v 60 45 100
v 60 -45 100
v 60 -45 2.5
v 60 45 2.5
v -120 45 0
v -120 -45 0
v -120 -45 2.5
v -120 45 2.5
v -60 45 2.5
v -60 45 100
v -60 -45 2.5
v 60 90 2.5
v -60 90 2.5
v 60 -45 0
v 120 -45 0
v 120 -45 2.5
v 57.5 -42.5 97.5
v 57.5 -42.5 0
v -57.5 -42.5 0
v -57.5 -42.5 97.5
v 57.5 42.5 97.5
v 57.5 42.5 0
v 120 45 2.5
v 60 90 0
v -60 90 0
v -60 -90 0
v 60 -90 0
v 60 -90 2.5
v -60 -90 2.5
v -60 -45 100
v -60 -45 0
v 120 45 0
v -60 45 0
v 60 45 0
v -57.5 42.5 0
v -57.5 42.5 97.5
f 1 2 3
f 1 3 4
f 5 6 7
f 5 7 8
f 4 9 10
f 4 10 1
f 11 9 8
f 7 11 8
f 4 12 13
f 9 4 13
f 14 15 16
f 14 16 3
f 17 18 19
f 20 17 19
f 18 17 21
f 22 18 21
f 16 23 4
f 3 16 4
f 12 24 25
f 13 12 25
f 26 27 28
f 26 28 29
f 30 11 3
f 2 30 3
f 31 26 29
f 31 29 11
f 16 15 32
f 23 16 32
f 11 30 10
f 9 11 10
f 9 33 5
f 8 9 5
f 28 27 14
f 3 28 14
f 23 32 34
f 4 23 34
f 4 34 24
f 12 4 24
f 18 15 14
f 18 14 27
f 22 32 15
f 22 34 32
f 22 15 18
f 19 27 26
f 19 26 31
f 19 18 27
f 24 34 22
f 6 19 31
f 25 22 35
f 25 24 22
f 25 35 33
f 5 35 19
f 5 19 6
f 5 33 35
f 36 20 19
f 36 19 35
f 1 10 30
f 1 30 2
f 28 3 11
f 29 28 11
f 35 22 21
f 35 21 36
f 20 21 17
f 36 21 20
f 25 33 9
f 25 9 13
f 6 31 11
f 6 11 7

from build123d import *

# Parameters (mm, degrees)
CROQUIS1_W              = 120
CROQUIS1_H              = 90
SALIENTE_EXTRUIR1_DEPTH = 100
CROQUIS2_W              = 115
CROQUIS2_H              = 85
CORTAR_EXTRUIR1_DEPTH   = 97.5
CROQUIS3_W              = 60
CROQUIS3_H              = 90
CROQUIS3_W_2            = 120
CROQUIS3_H_2            = 45
CROQUIS3_W_3            = 115
CROQUIS3_H_3            = 85
SALIENTE_EXTRUIR2_DEPTH = 2.5


with BuildPart() as part:
    # Croquis1 → Saliente-Extruir1 (new body)
    with BuildSketch(Plane.XY):
        Rectangle(CROQUIS1_W, CROQUIS1_H)
    extrude(amount=SALIENTE_EXTRUIR1_DEPTH)

    # Croquis2 → Cortar-Extruir1 (cut)
    with BuildSketch(Plane(origin=(0, 0, 0), x_dir=(-1, 0, 0), z_dir=(0, 0, -1))):
        Rectangle(CROQUIS2_W, CROQUIS2_H)
    extrude(amount=-CORTAR_EXTRUIR1_DEPTH, mode=Mode.SUBTRACT)

    # Croquis3 → Saliente-Extruir2 (add)
    # profile 1 of 5: a face of its own
    with BuildSketch(Plane(origin=(0, 0, 0), x_dir=(-1, 0, 0), z_dir=(0, 0, -1))):
        with Locations((-90, 0)):
            Rectangle(CROQUIS3_W, CROQUIS3_H)
    # profile 2 of 5: a face of its own
    with BuildSketch(Plane(origin=(0, 0, 0), x_dir=(-1, 0, 0), z_dir=(0, 0, -1))):
        with Locations((0, 67.5)):
            Rectangle(CROQUIS3_W_2, CROQUIS3_H_2)
    # profile 3 of 5: a face of its own
    with BuildSketch(Plane(origin=(0, 0, 0), x_dir=(-1, 0, 0), z_dir=(0, 0, -1))):
        Rectangle(CROQUIS3_W_2, CROQUIS3_H)
        Rectangle(CROQUIS3_W_3, CROQUIS3_H_3, mode=Mode.SUBTRACT)
    # profile 4 of 5: a face of its own
    with BuildSketch(Plane(origin=(0, 0, 0), x_dir=(-1, 0, 0), z_dir=(0, 0, -1))):
        with Locations((90, 0)):
            Rectangle(CROQUIS3_W, CROQUIS3_H)
    # profile 5 of 5: a face of its own
    with BuildSketch(Plane(origin=(0, 0, 0), x_dir=(-1, 0, 0), z_dir=(0, 0, -1))):
        with Locations((0, -67.5)):
            Rectangle(CROQUIS3_W_2, CROQUIS3_H_2)
    extrude(amount=-SALIENTE_EXTRUIR2_DEPTH)


solid = part.part
